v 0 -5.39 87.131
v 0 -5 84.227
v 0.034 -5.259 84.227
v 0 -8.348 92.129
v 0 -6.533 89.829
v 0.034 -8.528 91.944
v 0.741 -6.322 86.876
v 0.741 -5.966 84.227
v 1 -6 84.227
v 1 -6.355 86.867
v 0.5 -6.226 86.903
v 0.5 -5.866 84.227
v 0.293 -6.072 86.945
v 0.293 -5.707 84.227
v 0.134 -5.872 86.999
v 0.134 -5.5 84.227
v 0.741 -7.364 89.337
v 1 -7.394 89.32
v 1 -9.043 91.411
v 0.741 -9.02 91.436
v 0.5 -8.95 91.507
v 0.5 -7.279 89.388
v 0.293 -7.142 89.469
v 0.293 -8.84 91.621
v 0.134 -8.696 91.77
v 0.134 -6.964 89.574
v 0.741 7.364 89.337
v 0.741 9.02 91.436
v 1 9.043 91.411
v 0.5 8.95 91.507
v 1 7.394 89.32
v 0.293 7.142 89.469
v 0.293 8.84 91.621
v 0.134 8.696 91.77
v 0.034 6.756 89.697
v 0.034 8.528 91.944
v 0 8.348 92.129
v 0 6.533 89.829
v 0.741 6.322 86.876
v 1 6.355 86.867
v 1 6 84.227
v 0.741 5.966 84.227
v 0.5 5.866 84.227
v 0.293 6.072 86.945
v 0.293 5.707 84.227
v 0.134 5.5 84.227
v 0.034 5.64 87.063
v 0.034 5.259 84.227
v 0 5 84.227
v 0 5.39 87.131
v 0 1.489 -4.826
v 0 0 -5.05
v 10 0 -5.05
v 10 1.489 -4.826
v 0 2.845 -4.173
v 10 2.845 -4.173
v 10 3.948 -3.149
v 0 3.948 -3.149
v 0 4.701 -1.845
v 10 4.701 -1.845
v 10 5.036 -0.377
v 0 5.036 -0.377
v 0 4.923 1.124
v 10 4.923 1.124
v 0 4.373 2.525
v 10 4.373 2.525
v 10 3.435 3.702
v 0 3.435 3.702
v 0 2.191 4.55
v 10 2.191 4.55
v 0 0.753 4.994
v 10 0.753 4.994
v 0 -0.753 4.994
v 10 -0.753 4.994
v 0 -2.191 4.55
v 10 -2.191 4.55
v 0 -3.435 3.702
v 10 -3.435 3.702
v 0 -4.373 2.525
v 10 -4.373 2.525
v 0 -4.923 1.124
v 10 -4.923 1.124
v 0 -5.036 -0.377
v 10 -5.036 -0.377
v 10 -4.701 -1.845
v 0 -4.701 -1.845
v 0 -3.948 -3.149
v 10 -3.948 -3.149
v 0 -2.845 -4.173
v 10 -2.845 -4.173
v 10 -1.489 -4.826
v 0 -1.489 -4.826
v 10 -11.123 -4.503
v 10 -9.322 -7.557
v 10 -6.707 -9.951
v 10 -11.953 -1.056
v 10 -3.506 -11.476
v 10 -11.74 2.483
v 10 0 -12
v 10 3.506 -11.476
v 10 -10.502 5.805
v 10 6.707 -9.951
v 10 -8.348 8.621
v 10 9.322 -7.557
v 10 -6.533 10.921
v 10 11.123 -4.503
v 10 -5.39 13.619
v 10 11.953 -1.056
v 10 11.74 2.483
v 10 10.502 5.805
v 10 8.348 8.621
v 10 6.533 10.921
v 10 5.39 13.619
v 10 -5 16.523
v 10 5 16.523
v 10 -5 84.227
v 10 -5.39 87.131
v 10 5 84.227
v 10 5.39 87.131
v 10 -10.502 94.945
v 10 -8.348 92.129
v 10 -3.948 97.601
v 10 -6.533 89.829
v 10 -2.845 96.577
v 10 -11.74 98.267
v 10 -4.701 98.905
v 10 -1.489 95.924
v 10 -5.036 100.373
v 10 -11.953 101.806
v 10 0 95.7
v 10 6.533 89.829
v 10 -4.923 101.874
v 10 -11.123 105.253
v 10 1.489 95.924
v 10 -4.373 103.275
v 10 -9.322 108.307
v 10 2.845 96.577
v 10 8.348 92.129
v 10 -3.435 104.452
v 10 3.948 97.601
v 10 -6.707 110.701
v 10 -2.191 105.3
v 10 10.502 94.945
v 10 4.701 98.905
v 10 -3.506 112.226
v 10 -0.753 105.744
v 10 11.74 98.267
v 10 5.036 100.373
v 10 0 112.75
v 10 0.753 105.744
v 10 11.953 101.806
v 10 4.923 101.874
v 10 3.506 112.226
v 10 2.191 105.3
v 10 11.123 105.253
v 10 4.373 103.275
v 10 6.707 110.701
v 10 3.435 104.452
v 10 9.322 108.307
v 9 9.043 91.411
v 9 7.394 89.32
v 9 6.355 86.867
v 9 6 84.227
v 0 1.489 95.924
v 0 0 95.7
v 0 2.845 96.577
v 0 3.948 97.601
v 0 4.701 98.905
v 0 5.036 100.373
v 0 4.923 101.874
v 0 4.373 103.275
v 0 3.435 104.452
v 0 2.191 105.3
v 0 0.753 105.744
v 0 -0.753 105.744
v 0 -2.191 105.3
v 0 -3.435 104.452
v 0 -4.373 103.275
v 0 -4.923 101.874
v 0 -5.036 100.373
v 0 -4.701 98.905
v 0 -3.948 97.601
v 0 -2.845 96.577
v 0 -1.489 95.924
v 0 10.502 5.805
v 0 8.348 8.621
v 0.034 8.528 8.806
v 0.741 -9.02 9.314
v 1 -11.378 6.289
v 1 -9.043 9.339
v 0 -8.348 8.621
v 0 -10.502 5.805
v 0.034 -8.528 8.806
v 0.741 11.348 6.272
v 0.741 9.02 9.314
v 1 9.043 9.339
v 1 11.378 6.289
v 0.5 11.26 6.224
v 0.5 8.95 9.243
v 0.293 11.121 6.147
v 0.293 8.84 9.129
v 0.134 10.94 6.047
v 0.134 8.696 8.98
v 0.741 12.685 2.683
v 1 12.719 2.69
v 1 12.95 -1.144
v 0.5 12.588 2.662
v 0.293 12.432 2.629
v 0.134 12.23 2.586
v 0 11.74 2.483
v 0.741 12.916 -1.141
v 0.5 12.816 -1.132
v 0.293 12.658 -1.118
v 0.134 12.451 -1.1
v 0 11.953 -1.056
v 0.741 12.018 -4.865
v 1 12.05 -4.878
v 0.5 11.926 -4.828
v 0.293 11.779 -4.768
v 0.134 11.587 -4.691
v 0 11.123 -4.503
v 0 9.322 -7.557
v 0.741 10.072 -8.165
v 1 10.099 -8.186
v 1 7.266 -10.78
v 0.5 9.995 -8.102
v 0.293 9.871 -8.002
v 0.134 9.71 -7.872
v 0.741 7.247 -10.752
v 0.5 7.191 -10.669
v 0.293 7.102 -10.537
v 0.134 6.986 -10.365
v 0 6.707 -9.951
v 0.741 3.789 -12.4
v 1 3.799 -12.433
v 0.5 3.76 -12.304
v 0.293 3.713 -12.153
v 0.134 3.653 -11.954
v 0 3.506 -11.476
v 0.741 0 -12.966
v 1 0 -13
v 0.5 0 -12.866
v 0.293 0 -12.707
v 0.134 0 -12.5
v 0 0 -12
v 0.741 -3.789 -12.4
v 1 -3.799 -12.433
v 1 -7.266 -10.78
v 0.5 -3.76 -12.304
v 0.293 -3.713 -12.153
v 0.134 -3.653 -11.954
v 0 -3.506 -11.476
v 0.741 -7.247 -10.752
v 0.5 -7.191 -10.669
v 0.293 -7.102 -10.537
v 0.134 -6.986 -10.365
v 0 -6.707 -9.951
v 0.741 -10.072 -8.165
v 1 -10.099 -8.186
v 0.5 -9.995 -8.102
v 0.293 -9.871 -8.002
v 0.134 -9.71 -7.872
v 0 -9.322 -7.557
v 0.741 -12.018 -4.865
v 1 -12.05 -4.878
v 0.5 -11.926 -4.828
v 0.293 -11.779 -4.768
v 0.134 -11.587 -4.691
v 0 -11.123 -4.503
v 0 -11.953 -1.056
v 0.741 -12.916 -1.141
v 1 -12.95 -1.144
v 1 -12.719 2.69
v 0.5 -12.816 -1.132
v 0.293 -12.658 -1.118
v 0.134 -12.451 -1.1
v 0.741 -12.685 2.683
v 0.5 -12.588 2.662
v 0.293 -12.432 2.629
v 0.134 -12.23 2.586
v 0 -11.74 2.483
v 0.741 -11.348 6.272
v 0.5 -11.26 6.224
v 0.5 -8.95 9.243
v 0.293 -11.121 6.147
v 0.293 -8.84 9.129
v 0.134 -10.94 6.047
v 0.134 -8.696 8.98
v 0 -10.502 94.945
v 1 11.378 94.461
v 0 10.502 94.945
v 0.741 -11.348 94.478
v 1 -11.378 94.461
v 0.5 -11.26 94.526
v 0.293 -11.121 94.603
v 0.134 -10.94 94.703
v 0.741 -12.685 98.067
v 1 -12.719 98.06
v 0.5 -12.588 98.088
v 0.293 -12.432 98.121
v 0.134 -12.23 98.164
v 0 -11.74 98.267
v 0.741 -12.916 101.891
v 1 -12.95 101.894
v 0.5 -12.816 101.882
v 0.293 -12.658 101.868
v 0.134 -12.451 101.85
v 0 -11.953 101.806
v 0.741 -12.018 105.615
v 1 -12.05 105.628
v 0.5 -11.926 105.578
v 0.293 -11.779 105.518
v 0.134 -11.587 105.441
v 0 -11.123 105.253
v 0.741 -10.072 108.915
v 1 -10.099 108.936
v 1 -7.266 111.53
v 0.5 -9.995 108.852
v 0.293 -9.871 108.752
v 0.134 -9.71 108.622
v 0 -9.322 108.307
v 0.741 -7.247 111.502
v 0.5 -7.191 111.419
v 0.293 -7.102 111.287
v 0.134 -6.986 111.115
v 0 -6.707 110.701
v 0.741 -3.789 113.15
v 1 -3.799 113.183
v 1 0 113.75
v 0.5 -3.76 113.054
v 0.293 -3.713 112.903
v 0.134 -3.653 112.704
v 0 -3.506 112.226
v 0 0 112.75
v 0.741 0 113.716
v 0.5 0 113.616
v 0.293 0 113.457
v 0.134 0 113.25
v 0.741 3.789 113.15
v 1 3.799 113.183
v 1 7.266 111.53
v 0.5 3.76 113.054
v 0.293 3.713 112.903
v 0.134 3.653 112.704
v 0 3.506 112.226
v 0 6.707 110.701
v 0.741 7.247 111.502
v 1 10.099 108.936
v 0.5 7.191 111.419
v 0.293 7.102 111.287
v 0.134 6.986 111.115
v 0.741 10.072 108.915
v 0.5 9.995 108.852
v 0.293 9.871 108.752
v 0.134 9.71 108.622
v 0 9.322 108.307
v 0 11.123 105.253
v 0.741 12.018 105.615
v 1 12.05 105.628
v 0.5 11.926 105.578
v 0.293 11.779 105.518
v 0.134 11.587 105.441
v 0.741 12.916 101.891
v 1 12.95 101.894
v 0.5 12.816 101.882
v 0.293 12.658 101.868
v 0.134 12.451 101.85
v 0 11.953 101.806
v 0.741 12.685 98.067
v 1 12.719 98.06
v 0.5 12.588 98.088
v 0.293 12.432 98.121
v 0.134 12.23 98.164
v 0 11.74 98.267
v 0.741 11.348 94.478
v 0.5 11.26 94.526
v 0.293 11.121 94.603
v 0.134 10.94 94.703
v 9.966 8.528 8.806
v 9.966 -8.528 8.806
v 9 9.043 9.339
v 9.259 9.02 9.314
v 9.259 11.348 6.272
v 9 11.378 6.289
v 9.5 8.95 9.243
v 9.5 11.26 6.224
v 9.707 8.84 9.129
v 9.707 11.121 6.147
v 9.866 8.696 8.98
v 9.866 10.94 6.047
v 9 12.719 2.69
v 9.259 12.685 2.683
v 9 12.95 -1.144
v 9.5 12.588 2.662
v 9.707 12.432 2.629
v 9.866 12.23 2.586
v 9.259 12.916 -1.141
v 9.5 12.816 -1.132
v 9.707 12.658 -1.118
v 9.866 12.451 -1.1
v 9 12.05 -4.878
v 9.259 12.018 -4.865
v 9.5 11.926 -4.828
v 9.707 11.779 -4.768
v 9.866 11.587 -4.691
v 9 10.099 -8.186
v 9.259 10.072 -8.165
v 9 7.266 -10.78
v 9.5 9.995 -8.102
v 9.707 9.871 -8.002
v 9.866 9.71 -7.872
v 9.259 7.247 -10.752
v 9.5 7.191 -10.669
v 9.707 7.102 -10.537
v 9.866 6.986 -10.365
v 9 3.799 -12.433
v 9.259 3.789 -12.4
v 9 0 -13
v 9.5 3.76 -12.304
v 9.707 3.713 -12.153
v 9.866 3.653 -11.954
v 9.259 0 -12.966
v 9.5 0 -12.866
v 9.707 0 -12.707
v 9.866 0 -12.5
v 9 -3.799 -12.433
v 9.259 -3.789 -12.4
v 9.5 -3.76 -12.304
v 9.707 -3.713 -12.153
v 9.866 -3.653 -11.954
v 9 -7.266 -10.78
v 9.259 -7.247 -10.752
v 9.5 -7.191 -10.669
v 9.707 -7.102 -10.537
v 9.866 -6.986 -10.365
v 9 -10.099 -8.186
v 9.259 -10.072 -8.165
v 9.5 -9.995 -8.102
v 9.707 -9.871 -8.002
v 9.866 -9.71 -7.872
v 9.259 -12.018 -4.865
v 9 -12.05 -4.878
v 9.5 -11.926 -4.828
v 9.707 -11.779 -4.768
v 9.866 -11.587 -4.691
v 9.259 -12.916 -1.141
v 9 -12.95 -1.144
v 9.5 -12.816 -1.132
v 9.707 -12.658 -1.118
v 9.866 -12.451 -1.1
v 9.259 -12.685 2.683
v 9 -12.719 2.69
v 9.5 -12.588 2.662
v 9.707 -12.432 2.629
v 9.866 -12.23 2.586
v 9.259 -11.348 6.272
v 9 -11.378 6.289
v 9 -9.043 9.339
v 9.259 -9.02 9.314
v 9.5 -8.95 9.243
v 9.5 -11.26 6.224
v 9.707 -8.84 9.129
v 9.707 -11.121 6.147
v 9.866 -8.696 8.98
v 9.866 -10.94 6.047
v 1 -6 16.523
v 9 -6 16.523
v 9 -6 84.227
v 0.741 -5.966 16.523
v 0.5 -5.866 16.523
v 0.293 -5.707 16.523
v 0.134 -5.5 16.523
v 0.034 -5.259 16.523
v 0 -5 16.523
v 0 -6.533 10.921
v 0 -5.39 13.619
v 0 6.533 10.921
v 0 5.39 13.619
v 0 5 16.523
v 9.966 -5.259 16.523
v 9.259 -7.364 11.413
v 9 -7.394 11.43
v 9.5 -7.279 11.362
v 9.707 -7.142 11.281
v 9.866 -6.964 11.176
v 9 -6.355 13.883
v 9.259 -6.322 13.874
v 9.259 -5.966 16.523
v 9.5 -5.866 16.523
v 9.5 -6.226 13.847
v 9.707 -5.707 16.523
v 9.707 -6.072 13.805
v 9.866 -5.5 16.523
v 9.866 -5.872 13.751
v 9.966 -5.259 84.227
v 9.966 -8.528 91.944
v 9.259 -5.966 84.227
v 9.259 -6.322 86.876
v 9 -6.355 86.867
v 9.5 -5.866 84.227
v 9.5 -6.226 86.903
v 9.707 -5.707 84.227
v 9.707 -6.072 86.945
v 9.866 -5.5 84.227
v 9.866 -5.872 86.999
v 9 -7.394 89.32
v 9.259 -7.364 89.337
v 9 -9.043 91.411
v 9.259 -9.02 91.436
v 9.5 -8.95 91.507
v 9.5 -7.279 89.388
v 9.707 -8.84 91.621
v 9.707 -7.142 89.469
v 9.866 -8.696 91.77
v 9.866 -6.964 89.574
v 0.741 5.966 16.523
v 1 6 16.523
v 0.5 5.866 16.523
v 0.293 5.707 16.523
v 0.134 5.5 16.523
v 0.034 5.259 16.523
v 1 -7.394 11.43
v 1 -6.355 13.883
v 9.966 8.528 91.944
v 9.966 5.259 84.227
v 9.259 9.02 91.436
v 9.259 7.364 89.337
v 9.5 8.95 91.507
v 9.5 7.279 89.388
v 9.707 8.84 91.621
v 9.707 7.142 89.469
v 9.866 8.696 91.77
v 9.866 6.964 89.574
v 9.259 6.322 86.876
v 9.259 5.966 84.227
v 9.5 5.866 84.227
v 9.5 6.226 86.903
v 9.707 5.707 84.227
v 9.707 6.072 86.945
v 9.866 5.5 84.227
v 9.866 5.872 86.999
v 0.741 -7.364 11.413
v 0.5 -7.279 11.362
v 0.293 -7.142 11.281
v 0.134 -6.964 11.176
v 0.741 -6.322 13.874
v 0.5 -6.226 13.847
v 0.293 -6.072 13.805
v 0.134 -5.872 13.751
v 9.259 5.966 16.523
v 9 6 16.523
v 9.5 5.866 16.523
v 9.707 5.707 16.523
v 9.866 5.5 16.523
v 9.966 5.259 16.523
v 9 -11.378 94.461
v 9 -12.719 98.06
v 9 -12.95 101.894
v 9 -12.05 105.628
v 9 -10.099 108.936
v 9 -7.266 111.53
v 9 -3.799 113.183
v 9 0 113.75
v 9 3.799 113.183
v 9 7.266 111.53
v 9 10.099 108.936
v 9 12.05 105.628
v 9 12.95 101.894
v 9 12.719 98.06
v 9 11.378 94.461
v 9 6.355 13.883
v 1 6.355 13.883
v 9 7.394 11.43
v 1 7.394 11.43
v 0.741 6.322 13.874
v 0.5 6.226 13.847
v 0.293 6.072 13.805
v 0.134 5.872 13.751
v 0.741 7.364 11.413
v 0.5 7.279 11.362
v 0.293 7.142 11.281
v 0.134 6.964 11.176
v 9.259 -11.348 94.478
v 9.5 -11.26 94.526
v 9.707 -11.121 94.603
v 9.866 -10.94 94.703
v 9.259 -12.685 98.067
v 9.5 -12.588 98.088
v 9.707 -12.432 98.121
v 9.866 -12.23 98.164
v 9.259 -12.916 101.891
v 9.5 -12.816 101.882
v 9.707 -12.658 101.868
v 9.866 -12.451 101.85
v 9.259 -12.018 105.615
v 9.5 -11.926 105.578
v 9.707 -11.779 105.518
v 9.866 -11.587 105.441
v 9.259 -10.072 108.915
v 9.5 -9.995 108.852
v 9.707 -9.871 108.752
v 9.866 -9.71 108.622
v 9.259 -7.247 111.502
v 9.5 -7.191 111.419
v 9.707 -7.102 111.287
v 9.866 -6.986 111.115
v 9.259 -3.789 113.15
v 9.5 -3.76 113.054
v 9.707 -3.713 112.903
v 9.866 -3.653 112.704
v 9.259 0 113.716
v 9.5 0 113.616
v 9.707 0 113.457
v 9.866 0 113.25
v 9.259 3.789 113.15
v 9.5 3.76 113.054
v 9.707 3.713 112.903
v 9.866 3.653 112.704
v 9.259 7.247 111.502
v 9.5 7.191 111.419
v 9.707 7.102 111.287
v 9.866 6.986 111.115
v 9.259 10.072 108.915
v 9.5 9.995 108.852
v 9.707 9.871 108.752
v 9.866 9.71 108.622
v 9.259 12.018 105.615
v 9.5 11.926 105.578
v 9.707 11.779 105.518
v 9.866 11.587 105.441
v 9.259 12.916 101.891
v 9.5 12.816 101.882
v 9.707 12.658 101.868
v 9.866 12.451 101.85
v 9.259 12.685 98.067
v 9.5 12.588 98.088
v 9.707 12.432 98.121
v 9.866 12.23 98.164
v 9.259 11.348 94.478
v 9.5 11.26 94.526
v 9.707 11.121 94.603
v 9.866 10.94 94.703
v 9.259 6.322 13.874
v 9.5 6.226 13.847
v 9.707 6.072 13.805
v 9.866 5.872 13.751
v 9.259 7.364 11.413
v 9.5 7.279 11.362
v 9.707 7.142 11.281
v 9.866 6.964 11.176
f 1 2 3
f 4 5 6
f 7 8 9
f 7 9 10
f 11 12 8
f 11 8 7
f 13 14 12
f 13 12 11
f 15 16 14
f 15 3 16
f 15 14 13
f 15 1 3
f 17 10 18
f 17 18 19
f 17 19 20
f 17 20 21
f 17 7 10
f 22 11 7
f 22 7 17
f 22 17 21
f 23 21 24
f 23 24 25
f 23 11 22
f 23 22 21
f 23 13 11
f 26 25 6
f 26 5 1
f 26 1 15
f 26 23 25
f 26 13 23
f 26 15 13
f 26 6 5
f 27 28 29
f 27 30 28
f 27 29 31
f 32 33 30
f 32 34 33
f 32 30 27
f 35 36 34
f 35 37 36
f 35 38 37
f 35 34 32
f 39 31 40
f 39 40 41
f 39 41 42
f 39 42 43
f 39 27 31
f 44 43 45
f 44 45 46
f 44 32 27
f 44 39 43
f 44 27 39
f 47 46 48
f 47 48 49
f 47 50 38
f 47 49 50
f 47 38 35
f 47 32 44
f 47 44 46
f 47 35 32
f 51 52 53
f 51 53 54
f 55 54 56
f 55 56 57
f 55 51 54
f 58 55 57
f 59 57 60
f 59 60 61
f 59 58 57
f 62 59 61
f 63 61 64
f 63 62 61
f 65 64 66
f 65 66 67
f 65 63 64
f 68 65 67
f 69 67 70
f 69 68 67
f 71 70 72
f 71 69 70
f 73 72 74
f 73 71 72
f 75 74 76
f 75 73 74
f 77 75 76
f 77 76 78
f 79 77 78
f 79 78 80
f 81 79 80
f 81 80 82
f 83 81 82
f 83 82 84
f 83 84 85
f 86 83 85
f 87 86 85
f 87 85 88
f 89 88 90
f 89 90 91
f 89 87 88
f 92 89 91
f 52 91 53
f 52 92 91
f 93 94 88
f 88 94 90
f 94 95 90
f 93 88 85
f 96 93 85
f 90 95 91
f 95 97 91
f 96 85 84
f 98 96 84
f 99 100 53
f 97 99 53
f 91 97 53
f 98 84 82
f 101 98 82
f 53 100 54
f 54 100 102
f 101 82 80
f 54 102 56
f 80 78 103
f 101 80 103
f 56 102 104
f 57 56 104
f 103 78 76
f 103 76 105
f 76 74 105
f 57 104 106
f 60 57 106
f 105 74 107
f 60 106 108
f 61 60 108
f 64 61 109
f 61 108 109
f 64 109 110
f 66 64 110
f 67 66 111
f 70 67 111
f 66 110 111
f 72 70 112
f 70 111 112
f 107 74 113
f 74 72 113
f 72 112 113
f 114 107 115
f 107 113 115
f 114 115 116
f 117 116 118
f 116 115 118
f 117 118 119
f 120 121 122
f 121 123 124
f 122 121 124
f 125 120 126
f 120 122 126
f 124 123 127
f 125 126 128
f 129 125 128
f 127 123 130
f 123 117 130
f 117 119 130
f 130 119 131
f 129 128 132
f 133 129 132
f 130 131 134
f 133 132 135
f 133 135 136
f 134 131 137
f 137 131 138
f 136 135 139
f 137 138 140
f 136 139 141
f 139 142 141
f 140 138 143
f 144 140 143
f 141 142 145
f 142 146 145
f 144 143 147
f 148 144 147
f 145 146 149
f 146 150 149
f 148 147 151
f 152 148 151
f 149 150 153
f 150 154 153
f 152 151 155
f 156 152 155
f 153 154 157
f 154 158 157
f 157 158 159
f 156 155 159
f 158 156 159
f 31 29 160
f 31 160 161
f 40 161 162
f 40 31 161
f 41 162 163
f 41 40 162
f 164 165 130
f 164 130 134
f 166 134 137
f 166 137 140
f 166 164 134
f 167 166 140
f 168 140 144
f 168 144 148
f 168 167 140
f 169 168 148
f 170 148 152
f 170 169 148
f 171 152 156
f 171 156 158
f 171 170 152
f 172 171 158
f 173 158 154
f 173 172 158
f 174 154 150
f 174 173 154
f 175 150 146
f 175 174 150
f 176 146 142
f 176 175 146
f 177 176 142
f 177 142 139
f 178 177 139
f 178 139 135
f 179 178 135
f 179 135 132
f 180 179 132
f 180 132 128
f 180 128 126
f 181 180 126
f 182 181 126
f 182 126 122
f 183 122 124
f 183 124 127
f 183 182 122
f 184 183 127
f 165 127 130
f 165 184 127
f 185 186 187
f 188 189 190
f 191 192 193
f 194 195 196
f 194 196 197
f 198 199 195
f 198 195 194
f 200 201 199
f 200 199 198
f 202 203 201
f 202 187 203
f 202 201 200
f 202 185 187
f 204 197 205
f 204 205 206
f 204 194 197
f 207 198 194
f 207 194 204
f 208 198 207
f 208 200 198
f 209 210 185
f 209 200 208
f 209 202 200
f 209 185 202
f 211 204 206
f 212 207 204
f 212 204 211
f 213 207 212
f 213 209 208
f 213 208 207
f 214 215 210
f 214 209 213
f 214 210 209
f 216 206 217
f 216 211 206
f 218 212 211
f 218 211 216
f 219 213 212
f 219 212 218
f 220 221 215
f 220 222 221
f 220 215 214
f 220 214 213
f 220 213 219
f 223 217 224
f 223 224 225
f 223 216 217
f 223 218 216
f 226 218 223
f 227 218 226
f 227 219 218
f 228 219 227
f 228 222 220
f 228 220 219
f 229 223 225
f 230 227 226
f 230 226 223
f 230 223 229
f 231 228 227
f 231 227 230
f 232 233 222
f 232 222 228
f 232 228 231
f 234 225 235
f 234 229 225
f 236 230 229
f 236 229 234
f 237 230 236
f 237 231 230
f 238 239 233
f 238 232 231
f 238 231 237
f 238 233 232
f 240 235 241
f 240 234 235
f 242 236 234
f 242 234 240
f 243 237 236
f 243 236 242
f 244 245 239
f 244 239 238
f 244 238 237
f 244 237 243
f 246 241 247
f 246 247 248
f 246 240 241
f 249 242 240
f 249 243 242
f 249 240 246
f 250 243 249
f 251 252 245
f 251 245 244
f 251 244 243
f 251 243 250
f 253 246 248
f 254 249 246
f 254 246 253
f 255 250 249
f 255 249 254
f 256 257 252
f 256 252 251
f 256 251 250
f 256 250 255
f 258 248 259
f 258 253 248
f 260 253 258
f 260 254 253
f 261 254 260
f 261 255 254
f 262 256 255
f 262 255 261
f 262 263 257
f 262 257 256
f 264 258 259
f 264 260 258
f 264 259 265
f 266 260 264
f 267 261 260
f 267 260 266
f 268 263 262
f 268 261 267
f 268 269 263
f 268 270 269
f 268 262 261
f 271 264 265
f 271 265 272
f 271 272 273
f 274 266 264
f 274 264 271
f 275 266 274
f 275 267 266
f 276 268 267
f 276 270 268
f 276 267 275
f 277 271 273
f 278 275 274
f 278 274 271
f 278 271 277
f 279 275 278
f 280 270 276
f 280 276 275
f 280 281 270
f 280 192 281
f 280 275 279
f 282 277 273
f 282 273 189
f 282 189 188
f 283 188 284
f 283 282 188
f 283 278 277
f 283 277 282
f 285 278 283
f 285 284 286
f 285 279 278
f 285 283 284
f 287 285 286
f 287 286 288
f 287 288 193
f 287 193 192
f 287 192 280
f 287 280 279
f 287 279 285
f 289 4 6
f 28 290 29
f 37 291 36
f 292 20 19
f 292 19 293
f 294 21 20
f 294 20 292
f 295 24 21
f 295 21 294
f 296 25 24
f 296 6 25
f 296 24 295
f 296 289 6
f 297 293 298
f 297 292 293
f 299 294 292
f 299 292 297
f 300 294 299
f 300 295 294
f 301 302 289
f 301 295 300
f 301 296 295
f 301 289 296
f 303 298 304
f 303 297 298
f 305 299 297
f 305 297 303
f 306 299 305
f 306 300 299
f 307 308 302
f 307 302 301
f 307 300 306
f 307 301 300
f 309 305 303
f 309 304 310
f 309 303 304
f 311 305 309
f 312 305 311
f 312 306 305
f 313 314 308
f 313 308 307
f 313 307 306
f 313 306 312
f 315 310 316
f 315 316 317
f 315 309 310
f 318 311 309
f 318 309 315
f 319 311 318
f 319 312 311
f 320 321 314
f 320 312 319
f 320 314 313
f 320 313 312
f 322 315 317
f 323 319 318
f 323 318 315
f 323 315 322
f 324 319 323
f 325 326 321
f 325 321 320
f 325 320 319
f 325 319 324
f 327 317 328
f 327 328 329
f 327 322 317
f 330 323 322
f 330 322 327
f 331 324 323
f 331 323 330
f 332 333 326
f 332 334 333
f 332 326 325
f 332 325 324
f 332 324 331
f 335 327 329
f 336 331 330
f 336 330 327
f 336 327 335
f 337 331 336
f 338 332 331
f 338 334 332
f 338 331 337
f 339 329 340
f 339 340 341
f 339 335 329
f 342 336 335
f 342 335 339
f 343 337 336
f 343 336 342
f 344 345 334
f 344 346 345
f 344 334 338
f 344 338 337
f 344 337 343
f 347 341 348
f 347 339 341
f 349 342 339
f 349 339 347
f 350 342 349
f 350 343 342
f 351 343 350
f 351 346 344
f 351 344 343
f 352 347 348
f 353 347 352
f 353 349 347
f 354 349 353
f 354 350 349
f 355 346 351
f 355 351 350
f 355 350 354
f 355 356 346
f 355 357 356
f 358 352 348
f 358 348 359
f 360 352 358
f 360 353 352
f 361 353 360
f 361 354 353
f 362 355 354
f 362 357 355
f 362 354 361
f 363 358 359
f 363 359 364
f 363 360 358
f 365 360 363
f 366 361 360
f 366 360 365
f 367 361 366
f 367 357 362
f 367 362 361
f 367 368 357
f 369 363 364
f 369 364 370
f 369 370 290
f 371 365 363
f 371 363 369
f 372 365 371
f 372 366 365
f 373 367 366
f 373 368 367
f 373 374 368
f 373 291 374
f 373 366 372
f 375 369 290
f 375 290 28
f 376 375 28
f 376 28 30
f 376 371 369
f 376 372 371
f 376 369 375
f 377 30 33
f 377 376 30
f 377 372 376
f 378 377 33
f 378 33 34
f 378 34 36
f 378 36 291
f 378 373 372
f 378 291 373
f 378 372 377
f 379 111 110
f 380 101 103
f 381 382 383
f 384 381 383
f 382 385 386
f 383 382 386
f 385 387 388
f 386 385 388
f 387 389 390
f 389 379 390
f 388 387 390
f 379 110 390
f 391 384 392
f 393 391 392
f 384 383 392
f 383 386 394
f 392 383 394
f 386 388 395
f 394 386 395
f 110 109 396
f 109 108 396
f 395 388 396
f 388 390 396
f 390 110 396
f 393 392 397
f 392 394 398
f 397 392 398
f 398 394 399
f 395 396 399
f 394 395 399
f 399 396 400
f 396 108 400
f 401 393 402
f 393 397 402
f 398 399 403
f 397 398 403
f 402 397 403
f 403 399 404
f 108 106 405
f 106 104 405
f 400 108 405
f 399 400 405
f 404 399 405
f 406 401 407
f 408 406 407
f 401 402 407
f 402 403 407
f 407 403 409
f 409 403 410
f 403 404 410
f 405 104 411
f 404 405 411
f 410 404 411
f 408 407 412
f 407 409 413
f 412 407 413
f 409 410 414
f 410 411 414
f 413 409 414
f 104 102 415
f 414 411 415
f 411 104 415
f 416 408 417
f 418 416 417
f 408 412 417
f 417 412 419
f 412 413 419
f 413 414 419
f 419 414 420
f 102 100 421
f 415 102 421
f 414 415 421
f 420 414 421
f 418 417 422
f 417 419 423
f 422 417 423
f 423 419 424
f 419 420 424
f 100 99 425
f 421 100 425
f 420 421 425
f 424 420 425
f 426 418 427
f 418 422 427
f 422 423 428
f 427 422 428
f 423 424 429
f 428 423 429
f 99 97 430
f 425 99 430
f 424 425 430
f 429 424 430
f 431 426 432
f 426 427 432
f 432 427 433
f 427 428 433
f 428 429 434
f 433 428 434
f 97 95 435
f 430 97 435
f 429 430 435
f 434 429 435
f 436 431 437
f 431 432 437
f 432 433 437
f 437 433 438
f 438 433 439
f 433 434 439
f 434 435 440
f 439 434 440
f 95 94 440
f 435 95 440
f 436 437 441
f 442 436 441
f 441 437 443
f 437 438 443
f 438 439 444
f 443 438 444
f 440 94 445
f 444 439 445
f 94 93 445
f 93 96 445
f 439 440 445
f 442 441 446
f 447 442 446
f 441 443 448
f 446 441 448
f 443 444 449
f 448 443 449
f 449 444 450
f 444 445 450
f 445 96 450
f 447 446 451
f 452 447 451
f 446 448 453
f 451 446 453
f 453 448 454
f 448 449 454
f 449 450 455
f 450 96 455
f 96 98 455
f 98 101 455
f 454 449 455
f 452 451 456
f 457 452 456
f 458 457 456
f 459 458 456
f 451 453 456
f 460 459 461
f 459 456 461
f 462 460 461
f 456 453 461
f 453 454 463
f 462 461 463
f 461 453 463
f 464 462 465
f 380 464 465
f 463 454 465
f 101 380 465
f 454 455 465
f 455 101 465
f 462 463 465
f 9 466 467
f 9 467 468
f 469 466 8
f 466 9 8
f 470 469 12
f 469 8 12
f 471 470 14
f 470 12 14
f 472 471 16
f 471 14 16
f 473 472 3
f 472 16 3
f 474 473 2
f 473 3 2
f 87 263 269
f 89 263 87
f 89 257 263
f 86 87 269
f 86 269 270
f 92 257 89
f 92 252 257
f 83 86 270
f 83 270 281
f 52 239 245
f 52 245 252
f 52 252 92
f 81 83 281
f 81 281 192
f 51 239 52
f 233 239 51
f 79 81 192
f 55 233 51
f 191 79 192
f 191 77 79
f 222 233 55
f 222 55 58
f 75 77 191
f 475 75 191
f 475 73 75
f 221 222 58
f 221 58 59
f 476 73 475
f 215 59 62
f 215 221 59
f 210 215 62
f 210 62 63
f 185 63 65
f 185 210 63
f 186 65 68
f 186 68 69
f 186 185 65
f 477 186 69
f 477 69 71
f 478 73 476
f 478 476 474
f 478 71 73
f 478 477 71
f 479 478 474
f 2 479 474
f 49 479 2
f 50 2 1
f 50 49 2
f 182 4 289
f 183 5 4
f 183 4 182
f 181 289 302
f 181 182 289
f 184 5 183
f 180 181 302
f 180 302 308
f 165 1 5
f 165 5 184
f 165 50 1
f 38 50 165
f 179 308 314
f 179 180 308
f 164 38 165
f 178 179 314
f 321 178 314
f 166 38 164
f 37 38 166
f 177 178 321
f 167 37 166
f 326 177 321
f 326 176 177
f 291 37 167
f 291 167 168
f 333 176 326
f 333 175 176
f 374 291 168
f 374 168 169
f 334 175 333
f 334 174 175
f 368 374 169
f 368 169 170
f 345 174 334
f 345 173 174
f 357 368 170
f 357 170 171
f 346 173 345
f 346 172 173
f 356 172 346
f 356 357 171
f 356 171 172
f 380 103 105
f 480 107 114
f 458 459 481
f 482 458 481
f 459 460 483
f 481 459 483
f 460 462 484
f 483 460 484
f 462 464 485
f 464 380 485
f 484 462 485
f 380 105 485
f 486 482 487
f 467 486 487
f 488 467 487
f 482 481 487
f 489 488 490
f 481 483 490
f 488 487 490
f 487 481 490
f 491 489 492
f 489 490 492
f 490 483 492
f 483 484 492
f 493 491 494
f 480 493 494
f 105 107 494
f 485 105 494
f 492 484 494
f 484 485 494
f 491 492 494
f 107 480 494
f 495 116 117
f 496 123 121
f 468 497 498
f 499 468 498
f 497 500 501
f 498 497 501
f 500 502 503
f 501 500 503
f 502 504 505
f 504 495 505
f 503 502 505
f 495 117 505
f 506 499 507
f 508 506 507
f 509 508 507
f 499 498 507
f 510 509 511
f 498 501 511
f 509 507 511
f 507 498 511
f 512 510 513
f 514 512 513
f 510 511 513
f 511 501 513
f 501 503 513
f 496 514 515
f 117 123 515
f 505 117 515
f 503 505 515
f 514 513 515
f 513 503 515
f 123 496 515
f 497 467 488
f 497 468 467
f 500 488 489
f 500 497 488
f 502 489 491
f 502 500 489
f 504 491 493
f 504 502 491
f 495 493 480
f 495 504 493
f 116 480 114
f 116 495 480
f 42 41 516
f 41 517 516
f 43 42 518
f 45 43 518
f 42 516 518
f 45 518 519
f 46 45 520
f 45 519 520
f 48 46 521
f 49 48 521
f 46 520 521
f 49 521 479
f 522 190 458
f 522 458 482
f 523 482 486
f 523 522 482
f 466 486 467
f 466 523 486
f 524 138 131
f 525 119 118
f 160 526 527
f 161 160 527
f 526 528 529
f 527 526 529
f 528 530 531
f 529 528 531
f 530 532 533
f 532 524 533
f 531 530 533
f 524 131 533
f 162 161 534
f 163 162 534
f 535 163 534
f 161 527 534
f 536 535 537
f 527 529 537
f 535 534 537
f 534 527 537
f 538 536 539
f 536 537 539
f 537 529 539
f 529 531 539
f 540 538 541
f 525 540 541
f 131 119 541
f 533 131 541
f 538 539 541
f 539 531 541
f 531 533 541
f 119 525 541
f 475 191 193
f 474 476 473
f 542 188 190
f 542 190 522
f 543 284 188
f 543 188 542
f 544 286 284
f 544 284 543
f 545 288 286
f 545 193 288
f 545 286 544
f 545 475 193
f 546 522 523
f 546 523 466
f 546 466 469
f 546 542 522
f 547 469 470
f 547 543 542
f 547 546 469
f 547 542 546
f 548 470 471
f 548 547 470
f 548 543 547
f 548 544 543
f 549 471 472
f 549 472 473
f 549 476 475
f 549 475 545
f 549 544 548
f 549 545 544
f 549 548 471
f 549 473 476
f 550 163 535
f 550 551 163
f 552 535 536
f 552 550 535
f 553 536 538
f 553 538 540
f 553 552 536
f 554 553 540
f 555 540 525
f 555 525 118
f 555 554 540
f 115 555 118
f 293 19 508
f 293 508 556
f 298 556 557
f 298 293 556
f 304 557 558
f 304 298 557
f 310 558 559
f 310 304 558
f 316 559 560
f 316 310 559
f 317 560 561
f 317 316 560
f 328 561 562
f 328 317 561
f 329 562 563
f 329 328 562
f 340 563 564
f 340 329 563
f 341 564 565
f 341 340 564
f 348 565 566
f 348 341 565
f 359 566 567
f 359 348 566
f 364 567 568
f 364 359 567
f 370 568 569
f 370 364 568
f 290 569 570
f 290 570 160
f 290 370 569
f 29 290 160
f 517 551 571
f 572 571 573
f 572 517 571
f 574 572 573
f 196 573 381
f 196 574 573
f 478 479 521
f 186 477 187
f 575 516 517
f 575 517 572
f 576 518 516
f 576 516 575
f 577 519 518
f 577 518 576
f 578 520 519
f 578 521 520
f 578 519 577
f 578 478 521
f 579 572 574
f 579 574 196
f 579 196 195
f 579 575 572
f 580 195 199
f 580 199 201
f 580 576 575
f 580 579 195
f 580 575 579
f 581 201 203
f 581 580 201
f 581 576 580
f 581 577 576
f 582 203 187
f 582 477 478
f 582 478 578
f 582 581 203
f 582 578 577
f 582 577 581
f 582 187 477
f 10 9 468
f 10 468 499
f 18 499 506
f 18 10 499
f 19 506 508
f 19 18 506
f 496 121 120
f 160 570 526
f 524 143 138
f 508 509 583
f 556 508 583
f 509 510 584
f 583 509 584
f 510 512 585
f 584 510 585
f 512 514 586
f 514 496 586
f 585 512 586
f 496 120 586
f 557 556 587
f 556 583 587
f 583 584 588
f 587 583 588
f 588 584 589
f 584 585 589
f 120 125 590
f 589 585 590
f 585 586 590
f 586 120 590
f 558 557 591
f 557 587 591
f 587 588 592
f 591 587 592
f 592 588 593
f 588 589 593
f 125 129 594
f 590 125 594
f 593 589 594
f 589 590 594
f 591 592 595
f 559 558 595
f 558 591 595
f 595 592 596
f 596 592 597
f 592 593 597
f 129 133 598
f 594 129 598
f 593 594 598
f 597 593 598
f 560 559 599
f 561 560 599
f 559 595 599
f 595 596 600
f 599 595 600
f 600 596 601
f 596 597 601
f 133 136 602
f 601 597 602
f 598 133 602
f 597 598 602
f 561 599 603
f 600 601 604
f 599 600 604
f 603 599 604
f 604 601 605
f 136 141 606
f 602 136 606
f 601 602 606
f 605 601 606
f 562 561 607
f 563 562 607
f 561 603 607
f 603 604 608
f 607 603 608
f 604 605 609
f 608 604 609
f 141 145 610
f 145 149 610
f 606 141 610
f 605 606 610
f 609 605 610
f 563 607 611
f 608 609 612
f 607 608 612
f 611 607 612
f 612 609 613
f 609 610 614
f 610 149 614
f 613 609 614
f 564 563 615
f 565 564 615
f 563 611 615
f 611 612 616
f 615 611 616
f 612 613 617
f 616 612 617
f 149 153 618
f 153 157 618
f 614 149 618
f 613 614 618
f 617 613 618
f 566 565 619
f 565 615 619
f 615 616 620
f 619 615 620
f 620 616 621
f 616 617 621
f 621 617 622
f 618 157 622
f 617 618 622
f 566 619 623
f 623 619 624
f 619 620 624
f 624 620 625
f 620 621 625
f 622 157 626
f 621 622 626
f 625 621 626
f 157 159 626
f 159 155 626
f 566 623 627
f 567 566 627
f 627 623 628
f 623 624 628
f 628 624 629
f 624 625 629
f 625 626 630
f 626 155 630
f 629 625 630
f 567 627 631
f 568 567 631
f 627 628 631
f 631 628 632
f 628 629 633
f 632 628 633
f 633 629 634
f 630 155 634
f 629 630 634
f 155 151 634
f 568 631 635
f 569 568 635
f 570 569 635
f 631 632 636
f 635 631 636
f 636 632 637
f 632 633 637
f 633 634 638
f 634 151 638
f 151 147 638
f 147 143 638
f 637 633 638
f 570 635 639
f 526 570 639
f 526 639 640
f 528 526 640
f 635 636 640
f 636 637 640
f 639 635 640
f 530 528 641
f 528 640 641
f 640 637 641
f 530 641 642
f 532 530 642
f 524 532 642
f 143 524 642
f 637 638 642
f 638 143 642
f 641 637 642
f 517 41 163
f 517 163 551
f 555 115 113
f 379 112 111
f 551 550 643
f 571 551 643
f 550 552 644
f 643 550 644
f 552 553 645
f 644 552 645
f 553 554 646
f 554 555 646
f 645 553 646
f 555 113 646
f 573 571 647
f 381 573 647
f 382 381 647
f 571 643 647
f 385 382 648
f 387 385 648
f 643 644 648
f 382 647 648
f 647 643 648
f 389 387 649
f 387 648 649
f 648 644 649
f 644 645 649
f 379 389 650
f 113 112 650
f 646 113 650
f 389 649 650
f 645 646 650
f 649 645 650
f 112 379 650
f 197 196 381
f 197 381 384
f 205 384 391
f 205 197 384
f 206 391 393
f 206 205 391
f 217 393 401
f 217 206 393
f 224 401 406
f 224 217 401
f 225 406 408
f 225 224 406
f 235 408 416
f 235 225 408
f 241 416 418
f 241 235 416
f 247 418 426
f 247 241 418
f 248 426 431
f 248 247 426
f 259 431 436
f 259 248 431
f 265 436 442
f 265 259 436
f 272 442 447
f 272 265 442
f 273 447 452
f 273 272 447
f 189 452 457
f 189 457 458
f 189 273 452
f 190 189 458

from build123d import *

# Parameters (mm, degrees)
SKETCH_1_R      = 5.05
EXTRUDE_1_DEPTH = 10
FILLET_1_R      = 1


with BuildPart() as part:
    # 草图1 → 凸台-拉伸1 (new body)
    with BuildSketch(Plane(origin=(0, 0, 0), x_dir=(0, 0, -1), z_dir=(1, 0, 0))):
        with BuildLine():
            Line((-84.227288358, 6), (-16.522711642, 6))
            ThreePointArc((-16.522711642, 6), (-12.621764154, 6.792252789), (-9.338923971, 9.043478261))
            ThreePointArc((-9.338923971, 9.043478261), (13, 0), (-9.338923971, -9.043478261))
            ThreePointArc((-9.338923971, -9.043478261), (-12.621764154, -6.792252789), (-16.522711642, -6))
            Line((-16.522711642, -6), (-84.227288358, -6))
            ThreePointArc((-84.227288358, -6), (-88.128235846, -6.792252789), (-91.411076029, -9.043478261))
            ThreePointArc((-91.411076029, -9.043478261), (-113.75, 0), (-91.411076029, 9.043478261))
            ThreePointArc((-91.411076029, 9.043478261), (-88.128235846, 6.792252789), (-84.227288358, 6))
        make_face()
        with Locations((-100.75, 0)):
            Circle(SKETCH_1_R, mode=Mode.SUBTRACT)
        Circle(SKETCH_1_R, mode=Mode.SUBTRACT)
    extrude(amount=EXTRUDE_1_DEPTH)

    # 圆角1
    fillet_1_edges = [part.edges().sort_by_distance(p)[0] for p in [
        (0, 6, 50.375),
        (0, 6.792252789, 12.621764154),
        (0, 0, -13),
        (0, -6.792252789, 12.621764154),
        (10, 6.792252789, 12.621764154),
        (10, 6, 50.375),
        (10, 6.792252789, 88.128235846),
        (10, 0, 113.75),
        (10, -6.792252789, 88.128235846),
        (10, -6, 50.375),
        (10, -6.792252789, 12.621764154),
        (0, -6, 50.375),
        (10, 0, -13),
        (0, -6.792252789, 88.128235846),
        (0, 0, 113.75),
        (0, 6.792252789, 88.128235846),
    ]]
    fillet(fillet_1_edges, radius=FILLET_1_R)


solid = part.part
